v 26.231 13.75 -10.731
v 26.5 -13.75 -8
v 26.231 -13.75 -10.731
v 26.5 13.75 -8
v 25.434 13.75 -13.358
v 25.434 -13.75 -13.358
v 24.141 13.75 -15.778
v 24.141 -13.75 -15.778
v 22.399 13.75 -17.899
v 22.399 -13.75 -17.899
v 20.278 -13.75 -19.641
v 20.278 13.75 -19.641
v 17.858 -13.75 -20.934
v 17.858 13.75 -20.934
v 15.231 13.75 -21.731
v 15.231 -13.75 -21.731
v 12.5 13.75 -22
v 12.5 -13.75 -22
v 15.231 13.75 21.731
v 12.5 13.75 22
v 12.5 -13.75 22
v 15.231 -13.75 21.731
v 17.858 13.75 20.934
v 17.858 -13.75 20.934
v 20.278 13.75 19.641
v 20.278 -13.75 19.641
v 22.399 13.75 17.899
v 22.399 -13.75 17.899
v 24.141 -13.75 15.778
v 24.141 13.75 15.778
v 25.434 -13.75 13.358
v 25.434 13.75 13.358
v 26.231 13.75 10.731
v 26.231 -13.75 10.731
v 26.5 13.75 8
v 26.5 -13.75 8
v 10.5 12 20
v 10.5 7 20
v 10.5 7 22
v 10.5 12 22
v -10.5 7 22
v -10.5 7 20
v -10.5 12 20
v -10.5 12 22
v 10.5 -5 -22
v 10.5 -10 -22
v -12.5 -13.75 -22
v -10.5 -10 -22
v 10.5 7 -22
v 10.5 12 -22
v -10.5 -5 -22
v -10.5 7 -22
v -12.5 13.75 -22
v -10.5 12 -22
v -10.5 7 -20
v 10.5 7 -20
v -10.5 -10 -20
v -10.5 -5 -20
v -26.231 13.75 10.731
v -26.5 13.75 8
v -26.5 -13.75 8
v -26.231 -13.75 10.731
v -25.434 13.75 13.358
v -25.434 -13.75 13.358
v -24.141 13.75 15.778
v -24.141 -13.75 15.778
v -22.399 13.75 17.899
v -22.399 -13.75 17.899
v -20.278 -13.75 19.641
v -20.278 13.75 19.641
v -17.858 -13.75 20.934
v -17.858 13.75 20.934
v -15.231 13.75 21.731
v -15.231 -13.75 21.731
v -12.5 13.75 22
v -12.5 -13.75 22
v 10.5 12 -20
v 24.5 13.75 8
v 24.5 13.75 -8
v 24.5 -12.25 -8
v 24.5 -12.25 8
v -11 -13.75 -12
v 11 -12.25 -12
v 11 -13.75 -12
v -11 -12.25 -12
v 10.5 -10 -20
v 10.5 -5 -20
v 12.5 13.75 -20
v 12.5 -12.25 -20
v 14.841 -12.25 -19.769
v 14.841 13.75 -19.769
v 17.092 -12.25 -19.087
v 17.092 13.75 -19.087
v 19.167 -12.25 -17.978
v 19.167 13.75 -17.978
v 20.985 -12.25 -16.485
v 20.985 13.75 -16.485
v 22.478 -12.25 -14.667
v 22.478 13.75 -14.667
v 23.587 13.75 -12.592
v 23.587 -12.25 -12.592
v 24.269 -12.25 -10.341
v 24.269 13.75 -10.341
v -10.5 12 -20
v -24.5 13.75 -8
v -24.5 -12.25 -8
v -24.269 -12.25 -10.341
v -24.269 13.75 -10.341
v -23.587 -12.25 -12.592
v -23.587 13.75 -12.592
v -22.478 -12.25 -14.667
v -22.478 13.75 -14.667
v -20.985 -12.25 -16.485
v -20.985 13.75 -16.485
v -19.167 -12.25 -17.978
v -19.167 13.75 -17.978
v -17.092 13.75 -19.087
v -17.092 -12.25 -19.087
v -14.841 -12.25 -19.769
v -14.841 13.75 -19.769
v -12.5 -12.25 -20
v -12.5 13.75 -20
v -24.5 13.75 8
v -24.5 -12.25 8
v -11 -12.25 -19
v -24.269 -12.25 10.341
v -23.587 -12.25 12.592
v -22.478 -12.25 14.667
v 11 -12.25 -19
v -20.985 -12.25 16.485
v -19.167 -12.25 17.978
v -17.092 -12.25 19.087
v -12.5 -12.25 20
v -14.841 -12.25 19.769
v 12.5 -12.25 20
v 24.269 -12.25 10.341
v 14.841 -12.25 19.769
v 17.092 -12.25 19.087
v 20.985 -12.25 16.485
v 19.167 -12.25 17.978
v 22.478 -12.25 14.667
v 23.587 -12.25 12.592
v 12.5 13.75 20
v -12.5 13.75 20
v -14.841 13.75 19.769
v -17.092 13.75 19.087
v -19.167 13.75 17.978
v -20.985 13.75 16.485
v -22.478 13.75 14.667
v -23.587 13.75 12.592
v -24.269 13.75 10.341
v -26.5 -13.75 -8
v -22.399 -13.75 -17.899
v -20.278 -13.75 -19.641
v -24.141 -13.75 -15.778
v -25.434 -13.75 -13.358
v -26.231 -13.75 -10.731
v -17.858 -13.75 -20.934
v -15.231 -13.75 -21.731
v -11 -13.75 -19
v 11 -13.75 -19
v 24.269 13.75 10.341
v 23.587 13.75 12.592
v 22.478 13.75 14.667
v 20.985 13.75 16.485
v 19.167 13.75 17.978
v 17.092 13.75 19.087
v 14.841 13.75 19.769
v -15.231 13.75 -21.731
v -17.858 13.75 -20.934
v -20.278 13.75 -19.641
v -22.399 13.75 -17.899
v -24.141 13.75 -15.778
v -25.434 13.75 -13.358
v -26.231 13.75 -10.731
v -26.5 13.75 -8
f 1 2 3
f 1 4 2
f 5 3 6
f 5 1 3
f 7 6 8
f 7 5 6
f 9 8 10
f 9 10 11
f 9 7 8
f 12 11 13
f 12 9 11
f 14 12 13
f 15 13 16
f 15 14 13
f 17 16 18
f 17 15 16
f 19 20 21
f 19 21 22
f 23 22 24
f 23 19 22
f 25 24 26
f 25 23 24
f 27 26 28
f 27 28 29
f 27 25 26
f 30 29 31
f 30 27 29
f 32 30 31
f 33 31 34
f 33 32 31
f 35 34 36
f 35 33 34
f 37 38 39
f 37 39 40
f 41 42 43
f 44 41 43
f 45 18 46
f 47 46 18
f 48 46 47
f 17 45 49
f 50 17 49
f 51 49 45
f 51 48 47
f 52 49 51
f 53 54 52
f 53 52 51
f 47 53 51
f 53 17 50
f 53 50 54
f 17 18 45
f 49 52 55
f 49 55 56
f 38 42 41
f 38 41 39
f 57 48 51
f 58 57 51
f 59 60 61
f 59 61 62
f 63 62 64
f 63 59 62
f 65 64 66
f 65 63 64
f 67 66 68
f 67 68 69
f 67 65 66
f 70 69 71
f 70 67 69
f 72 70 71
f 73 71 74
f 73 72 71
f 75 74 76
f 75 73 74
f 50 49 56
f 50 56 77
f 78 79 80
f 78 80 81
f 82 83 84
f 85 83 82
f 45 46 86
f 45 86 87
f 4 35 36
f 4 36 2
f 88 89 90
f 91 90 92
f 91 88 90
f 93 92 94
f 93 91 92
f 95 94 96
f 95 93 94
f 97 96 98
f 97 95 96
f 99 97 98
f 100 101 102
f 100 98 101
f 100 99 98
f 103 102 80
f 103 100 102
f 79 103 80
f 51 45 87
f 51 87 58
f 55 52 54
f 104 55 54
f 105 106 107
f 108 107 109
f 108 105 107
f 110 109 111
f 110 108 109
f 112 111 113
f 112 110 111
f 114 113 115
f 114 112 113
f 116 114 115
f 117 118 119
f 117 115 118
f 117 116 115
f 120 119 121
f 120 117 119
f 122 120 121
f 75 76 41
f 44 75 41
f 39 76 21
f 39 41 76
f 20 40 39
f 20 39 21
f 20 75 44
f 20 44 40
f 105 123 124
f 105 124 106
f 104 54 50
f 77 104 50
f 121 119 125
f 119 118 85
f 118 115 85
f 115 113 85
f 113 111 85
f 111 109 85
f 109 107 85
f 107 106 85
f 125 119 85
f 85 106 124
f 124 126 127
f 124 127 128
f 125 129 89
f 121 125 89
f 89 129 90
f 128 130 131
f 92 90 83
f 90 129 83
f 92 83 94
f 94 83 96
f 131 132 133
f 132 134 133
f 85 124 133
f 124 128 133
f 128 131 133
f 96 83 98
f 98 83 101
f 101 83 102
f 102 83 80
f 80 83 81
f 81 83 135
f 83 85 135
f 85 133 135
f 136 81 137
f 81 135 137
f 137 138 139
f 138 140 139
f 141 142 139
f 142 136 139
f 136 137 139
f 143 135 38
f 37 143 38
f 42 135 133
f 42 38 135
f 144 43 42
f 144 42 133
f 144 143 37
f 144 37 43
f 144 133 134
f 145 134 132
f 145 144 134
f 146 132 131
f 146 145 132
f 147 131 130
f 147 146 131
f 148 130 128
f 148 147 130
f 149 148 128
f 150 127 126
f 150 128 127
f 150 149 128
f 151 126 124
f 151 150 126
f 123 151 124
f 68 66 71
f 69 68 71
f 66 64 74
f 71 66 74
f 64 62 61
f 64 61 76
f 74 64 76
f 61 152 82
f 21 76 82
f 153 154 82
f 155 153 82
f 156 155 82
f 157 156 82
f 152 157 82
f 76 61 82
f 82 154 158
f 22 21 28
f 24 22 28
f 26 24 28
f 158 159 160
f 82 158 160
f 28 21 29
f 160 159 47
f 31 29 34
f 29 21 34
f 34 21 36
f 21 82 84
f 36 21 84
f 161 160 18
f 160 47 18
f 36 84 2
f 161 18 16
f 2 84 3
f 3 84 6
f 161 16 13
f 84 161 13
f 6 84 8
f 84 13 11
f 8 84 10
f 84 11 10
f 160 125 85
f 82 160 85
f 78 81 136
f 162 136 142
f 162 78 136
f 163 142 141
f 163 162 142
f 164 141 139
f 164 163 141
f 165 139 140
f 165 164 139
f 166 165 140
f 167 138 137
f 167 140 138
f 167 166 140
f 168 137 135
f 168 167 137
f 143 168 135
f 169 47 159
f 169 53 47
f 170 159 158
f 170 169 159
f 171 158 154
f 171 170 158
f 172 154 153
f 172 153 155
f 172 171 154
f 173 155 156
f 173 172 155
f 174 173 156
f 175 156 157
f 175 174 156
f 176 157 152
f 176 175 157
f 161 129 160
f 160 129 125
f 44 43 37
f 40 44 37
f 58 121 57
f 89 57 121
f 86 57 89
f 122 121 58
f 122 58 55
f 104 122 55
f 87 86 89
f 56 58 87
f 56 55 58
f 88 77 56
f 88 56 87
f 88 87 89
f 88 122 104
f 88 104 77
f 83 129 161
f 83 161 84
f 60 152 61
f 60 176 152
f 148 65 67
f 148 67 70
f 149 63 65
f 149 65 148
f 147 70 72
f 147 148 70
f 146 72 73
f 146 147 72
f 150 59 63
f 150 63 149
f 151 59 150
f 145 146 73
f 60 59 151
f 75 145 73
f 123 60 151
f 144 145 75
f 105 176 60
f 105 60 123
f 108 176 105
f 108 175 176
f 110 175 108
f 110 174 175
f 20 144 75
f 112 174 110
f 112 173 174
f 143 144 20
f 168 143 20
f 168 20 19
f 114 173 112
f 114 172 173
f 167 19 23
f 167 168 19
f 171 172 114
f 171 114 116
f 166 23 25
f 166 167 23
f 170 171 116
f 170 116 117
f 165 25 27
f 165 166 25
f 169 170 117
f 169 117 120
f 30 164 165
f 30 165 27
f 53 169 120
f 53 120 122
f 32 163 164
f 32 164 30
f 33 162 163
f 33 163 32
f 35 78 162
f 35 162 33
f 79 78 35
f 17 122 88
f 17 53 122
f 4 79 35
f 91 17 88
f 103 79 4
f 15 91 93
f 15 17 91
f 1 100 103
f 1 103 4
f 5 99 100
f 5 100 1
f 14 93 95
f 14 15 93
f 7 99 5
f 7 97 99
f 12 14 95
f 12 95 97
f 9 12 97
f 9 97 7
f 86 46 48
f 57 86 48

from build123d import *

# Parameters (mm, degrees)
BOSS_EXTRUDE1_DEPTH     = 13.75
CUT_EXTRUDE1_DEPTH      = 52.529724432
CUT_EXTRUDE1_DEPTH_BACK = 52.529724432
SKETCH2_W               = 21
SKETCH2_H               = 5
BOSS_EXTRUDE2_START     = -1.5
BOSS_EXTRUDE2_DEPTH     = 1.5
SKETCH4_W               = 21
SKETCH4_H               = 5
CUT_EXTRUDE2_DEPTH      = 2
SKETCH5_W               = 22
SKETCH5_H               = 7
CUT_EXTRUDE3_DEPTH      = 2


with BuildPart() as part:
    # Sketch1 → Boss-Extrude1 (new, symmetric)
    with BuildSketch(Plane(origin=(0, 0, 0), x_dir=(1, 0, 0), z_dir=(0, 1, 0))):
        with BuildLine():
            Line((-26.5, 8), (-26.5, -8))
            ThreePointArc((-26.5, -8), (-22.399494937, -17.899494937), (-12.5, -22))
            Line((-12.5, -22), (12.5, -22))
            ThreePointArc((12.5, -22), (22.399494937, -17.899494937), (26.5, -8))
            Line((26.5, -8), (26.5, 8))
            ThreePointArc((26.5, 8), (22.399494937, 17.899494937), (12.5, 22))
            Line((12.5, 22), (-12.5, 22))
            ThreePointArc((-12.5, 22), (-22.399494937, 17.899494937), (-26.5, 8))
        make_face()
        with BuildLine():
            Line((12.5, -20), (-12.5, -20))
            ThreePointArc((-12.5, -20), (-20.985281374, -16.485281374), (-24.5, -8))
            Line((-24.5, -8), (-24.5, 8))
            ThreePointArc((-24.5, 8), (-20.985281374, 16.485281374), (-12.5, 20))
            Line((-12.5, 20), (12.5, 20))
            ThreePointArc((12.5, 20), (20.985281374, 16.485281374), (24.5, 8))
            Line((24.5, 8), (24.5, -8))
            ThreePointArc((24.5, -8), (20.985281374, -16.485281374), (12.5, -20))
        make_face(mode=Mode.SUBTRACT)
    extrude(amount=BOSS_EXTRUDE1_DEPTH, both=True)

    # Sketch2 → Cut-Extrude1 (cut, two sides: drawn at the far end of the back side and taken through both)
    with BuildSketch(Plane.XY.offset(-20).offset(-CUT_EXTRUDE1_DEPTH_BACK)):
        with Locations((0, 9.5)):
            Rectangle(SKETCH2_W, SKETCH2_H)
    extrude(amount=CUT_EXTRUDE1_DEPTH + CUT_EXTRUDE1_DEPTH_BACK, mode=Mode.SUBTRACT)

    # Sketch3 → Boss-Extrude2 (add)
    with BuildSketch(Plane.XZ.offset(13.75).offset(BOSS_EXTRUDE2_START)):
        with BuildLine():
            Line((-12.5, -22), (12.5, -22))
            ThreePointArc((12.5, -22), (22.399494937, -17.899494937), (26.5, -8))
            Line((26.5, -8), (26.5, 8))
            ThreePointArc((26.5, 8), (22.399494937, 17.899494937), (12.5, 22))
            Line((12.5, 22), (-12.5, 22))
            ThreePointArc((-12.5, 22), (-22.399494937, 17.899494937), (-26.5, 8))
            Line((-26.5, 8), (-26.5, -8))
            ThreePointArc((-26.5, -8), (-22.399494937, -17.899494937), (-12.5, -22))
        make_face()
    extrude(amount=BOSS_EXTRUDE2_DEPTH)

    # Sketch4 → Cut-Extrude2 (cut)
    with BuildSketch(Plane(origin=(0, 0, -22), x_dir=(-1, 0, 0), z_dir=(0, 0, -1))):
        with Locations((0, -7.5)):
            Rectangle(SKETCH4_W, SKETCH4_H)
    extrude(amount=-CUT_EXTRUDE2_DEPTH, mode=Mode.SUBTRACT)

    # Sketch5 → Cut-Extrude3 (cut)
    with BuildSketch(Plane(origin=(0, -12.25, 0), x_dir=(-1, 0, 0), z_dir=(0, 1, 0))):
        with Locations((0, -15.5)):
            Rectangle(SKETCH5_W, SKETCH5_H)
    extrude(amount=-CUT_EXTRUDE3_DEPTH, mode=Mode.SUBTRACT)


solid = part.part
